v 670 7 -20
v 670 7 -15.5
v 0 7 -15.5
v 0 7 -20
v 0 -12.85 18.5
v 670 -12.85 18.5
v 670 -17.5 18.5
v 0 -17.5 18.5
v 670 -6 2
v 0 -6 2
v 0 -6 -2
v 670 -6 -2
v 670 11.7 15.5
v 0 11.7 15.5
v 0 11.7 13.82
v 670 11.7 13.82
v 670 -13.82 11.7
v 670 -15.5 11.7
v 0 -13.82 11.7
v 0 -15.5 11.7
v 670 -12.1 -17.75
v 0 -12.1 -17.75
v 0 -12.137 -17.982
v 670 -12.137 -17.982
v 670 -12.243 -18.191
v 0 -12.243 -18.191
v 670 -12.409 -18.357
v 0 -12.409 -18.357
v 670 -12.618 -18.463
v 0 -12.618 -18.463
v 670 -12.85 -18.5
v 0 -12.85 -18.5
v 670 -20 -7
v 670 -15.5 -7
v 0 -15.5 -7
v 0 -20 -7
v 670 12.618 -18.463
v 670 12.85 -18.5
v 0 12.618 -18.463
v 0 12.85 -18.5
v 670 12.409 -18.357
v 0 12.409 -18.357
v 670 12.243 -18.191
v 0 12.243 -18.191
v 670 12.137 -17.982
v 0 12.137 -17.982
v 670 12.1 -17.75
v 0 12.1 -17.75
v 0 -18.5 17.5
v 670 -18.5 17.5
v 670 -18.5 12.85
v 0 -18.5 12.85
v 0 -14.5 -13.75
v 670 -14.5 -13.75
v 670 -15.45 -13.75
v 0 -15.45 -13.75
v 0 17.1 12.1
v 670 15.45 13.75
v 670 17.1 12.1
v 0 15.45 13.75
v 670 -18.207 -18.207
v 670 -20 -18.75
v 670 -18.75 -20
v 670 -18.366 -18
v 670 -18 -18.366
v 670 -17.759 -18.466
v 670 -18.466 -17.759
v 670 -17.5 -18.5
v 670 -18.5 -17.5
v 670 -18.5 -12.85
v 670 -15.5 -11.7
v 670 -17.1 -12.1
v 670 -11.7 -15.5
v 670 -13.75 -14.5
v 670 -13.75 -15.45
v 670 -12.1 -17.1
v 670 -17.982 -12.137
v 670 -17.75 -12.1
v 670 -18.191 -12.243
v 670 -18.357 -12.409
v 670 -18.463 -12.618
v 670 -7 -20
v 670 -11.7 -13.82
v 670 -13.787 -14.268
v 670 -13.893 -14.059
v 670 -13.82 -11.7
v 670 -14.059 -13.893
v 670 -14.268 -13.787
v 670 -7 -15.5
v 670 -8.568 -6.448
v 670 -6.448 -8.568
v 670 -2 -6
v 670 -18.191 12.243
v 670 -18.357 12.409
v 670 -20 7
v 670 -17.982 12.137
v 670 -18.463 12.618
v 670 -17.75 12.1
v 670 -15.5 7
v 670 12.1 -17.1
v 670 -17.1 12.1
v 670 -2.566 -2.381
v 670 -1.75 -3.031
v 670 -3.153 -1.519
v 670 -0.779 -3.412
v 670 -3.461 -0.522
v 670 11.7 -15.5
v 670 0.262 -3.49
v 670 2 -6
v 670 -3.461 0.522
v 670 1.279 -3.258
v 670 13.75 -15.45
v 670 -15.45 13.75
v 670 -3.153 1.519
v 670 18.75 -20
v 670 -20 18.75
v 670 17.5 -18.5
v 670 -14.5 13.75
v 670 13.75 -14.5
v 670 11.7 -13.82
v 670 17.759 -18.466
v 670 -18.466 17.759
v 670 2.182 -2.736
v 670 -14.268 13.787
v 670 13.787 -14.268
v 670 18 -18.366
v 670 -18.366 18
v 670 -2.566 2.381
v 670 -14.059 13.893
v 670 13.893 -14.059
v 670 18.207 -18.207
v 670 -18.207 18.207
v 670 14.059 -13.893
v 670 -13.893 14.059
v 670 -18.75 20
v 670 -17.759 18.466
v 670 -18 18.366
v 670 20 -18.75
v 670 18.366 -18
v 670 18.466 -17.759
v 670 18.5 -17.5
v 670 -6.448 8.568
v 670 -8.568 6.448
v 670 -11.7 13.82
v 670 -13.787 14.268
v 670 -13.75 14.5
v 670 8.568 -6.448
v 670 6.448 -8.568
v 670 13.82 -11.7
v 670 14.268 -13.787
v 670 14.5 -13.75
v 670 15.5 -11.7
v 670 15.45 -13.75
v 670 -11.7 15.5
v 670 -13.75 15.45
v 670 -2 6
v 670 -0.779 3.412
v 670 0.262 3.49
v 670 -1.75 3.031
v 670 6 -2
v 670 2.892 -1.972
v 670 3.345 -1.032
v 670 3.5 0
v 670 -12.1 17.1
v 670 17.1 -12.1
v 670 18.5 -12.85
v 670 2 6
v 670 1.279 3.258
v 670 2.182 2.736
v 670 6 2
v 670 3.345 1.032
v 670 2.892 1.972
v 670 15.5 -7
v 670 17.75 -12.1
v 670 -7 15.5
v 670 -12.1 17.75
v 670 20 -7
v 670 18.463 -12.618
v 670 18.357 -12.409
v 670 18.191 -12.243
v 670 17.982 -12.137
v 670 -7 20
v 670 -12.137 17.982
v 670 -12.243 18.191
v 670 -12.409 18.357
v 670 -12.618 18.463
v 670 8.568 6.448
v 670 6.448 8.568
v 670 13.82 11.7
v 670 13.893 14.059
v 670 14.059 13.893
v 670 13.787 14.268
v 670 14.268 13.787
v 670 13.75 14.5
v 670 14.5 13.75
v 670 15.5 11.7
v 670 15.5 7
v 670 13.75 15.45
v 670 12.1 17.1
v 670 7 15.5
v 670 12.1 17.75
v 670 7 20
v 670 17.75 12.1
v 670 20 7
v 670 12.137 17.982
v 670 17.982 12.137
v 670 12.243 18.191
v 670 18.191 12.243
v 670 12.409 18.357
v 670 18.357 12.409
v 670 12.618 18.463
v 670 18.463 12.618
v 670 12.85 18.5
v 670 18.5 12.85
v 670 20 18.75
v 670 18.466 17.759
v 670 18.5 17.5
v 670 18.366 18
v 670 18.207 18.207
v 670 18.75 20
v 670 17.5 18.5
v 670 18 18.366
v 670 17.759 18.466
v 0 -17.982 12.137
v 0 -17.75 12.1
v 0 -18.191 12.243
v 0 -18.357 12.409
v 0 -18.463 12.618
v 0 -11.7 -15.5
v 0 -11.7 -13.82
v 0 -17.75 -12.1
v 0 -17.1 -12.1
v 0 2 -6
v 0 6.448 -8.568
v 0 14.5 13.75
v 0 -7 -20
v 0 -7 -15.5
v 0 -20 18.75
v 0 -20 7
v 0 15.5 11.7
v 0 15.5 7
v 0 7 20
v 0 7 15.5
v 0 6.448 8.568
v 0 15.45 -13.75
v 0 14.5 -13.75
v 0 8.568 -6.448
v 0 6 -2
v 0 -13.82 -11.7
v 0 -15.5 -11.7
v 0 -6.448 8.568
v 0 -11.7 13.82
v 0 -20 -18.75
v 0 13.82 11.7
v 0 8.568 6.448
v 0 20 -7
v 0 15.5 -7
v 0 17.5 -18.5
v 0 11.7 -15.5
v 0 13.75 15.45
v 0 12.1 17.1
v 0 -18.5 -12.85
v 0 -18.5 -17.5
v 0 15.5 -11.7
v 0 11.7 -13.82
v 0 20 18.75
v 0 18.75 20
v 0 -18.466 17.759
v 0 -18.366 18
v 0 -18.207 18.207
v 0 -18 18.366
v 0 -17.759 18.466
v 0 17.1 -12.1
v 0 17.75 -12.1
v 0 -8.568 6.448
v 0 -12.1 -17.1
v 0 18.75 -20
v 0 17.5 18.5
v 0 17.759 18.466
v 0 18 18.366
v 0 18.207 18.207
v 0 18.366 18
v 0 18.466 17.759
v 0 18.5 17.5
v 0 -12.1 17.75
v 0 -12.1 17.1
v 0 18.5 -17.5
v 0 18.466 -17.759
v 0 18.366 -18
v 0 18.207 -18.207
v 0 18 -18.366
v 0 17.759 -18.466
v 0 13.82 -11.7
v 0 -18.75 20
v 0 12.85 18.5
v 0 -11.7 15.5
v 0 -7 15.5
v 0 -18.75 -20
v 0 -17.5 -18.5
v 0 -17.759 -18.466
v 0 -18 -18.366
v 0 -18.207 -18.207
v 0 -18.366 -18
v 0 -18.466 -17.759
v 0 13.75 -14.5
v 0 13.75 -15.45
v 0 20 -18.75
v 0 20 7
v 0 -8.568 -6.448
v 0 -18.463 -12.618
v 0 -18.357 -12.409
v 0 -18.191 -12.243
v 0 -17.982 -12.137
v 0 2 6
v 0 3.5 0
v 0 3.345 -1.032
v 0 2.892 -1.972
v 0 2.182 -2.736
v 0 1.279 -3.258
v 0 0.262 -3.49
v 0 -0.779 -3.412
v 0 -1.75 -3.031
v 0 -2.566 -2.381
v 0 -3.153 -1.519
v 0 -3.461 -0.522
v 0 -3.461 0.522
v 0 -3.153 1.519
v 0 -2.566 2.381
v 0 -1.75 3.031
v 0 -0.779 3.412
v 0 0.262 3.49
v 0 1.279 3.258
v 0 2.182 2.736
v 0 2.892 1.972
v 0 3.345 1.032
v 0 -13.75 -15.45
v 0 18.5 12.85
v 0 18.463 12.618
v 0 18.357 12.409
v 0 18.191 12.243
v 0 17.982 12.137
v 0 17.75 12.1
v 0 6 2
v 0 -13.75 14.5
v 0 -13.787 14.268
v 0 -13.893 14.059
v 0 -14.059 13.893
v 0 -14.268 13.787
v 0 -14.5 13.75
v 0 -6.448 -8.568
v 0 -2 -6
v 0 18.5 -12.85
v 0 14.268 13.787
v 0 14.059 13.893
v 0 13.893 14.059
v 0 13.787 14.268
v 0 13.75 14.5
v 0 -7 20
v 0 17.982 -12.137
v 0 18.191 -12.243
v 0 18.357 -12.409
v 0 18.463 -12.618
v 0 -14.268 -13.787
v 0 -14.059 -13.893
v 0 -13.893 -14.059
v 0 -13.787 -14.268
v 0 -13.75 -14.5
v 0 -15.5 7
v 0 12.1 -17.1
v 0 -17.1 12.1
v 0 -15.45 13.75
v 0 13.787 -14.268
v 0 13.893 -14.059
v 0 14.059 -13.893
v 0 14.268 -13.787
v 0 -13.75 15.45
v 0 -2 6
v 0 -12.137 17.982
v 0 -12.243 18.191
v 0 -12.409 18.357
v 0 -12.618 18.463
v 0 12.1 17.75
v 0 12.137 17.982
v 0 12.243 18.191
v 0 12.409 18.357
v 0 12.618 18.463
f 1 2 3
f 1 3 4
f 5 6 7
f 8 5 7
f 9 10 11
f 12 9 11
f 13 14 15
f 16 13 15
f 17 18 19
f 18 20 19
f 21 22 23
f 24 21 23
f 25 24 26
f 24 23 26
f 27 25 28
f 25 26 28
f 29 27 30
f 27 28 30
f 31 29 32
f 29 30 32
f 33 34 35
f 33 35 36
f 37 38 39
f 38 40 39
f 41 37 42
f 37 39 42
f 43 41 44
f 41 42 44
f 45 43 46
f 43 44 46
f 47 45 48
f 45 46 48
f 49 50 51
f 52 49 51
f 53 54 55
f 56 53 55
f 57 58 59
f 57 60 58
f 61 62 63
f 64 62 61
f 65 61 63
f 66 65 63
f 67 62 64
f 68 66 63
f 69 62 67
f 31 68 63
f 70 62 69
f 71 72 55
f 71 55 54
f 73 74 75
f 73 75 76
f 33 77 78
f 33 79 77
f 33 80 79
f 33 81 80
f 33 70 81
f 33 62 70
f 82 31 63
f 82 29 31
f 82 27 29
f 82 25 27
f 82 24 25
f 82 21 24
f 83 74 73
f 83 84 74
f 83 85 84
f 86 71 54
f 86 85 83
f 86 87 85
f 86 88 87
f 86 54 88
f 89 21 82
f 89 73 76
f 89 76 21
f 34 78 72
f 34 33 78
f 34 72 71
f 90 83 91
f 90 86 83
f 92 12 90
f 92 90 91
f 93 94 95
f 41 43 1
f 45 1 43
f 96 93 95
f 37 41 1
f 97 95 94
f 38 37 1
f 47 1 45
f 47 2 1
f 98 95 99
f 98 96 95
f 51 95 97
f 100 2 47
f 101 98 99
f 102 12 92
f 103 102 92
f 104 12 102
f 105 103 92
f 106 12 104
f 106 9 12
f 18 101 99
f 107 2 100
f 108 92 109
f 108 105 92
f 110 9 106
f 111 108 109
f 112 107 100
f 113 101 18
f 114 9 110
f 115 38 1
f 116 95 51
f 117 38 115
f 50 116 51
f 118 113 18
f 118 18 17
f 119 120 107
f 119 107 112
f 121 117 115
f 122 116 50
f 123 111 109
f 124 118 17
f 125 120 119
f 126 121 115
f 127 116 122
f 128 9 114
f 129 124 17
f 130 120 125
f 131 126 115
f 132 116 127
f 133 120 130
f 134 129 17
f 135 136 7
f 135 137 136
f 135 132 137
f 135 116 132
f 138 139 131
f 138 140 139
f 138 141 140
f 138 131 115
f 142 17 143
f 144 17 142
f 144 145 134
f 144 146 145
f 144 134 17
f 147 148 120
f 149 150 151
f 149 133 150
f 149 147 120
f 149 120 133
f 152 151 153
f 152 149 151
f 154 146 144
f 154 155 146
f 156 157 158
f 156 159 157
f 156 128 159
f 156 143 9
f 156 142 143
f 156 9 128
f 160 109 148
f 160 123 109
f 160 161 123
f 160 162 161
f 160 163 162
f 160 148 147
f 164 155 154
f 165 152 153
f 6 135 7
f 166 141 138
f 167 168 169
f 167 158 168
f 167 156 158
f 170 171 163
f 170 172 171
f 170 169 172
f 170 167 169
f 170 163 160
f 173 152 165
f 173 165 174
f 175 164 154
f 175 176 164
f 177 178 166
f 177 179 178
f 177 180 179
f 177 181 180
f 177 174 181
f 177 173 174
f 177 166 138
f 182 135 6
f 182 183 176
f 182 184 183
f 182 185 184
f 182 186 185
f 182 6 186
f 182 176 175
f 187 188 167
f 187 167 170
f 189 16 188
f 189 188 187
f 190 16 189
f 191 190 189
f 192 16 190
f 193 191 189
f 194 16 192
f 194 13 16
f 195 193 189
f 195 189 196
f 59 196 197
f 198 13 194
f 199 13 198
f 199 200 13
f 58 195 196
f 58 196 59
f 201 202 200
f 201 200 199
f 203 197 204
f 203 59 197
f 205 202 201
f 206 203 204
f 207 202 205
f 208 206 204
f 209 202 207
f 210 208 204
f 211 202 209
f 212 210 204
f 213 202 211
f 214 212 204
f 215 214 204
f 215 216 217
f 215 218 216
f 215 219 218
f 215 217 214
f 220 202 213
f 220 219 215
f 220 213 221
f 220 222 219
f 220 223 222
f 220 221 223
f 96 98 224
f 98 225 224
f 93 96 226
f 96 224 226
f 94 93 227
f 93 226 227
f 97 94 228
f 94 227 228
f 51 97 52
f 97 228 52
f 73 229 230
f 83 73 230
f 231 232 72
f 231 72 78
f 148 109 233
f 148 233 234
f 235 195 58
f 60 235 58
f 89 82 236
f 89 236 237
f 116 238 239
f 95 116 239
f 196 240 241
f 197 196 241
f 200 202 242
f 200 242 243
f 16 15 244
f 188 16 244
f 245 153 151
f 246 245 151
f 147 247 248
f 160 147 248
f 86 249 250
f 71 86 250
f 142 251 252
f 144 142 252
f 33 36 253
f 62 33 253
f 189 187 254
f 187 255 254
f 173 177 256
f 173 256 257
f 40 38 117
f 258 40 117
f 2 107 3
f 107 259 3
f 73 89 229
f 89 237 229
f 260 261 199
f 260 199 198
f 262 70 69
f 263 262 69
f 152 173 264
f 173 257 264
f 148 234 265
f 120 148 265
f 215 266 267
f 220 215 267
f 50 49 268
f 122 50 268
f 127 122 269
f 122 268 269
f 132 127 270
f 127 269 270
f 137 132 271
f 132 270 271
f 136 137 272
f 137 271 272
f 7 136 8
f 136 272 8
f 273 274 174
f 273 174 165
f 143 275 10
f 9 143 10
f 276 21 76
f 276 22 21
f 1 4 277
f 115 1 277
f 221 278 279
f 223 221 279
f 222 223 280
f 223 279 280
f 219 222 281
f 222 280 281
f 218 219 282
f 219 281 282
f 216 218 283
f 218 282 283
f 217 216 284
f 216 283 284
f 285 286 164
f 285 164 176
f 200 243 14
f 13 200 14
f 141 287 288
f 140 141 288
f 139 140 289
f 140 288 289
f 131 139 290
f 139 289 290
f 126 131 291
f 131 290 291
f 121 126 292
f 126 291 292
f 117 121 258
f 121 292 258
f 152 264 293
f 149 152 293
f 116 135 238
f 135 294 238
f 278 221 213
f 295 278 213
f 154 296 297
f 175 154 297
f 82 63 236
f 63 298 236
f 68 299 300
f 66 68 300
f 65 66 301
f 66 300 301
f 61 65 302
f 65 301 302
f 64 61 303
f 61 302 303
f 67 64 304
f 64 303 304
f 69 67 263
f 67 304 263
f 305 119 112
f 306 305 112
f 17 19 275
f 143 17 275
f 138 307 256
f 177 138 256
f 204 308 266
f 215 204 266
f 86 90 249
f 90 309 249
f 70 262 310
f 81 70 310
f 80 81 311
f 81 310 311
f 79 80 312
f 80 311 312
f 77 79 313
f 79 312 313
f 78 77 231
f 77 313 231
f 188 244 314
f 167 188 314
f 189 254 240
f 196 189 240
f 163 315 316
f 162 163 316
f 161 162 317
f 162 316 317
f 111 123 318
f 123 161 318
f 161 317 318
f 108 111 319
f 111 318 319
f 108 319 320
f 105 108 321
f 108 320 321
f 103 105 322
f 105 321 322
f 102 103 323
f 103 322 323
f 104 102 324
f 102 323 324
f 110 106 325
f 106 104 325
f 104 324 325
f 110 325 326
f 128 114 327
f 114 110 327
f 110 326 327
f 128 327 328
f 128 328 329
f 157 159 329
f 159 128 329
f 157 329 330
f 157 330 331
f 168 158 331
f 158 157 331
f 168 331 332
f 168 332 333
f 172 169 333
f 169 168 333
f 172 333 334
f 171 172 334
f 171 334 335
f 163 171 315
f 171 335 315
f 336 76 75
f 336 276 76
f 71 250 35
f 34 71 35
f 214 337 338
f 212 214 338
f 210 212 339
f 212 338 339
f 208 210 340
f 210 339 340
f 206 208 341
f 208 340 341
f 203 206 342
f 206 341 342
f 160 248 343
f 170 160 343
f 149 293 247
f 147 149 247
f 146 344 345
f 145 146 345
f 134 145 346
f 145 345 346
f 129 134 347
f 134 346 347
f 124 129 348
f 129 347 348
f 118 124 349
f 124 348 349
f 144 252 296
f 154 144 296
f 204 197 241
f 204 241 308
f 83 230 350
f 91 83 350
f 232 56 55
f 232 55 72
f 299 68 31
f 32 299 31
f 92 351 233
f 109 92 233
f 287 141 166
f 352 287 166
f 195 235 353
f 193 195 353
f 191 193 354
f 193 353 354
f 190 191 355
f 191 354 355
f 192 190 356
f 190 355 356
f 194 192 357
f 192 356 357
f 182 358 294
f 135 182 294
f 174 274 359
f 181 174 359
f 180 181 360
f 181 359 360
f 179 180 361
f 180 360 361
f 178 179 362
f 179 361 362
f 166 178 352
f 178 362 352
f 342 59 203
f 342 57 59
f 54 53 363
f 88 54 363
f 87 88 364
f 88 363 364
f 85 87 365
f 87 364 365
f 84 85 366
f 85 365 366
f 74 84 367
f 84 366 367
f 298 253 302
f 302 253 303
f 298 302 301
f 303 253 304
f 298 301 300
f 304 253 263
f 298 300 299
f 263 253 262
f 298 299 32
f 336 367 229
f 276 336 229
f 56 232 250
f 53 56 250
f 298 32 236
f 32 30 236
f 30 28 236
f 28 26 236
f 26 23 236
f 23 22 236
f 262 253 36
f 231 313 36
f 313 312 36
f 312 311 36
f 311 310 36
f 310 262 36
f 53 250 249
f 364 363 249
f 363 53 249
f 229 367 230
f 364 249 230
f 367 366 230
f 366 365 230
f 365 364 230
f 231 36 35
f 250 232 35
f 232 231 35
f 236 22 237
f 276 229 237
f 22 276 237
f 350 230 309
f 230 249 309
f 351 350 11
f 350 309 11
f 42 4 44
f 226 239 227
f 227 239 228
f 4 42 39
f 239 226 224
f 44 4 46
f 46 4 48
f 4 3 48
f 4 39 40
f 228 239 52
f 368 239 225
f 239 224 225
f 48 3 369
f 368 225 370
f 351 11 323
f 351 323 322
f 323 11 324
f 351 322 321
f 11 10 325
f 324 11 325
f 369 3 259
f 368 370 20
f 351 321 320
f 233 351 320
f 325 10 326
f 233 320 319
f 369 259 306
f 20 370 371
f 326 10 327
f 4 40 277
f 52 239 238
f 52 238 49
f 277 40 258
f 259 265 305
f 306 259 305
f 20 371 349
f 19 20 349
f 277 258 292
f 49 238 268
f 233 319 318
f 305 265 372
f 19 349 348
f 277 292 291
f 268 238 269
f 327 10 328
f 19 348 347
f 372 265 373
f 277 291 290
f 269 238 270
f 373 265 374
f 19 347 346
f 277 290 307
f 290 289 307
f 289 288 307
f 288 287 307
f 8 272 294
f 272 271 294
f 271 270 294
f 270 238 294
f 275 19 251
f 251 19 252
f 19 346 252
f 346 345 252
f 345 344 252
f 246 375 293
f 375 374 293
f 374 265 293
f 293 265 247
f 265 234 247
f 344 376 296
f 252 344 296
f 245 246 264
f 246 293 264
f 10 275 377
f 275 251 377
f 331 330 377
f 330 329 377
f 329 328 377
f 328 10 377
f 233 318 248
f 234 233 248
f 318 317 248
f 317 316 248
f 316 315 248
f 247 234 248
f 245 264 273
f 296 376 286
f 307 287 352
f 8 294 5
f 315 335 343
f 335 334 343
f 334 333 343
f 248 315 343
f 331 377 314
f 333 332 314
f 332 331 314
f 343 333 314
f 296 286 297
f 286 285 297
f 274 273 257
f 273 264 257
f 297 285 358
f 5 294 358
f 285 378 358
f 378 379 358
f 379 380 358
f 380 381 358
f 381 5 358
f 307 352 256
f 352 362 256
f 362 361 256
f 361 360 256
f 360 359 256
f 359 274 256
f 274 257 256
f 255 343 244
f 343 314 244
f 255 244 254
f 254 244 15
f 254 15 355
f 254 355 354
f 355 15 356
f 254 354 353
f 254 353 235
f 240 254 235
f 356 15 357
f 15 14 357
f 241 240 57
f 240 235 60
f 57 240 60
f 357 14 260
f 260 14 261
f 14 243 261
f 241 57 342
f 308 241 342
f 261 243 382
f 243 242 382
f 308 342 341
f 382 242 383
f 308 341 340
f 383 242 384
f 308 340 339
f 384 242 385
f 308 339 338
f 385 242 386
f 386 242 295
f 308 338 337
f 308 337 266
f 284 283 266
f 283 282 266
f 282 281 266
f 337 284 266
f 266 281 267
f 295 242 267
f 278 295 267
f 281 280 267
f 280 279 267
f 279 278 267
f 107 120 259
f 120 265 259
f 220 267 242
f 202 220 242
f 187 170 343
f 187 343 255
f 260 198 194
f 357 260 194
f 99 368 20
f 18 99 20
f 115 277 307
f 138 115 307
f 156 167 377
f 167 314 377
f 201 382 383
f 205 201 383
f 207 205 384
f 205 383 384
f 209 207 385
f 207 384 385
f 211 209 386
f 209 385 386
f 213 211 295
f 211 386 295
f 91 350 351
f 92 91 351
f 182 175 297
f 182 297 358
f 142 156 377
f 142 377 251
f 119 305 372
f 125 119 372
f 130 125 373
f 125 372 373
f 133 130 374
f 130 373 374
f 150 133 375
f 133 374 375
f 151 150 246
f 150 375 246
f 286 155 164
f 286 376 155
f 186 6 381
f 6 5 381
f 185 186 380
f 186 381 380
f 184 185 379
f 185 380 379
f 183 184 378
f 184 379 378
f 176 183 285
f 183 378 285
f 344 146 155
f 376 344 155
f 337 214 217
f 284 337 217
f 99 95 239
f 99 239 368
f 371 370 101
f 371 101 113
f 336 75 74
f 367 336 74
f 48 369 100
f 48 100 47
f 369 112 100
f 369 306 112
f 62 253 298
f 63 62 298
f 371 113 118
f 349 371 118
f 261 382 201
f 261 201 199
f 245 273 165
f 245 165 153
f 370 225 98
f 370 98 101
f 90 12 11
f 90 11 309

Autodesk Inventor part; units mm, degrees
sketch "Skizze_1" plane through (0, 0, 0) normal (1, 0, 0) x (0, 1, 0)
  line L0 (18.75, 20) -> (7, 20)
  line L1 (7, 20) -> (7, 15.5)
  line L2 (7, 15.5) -> (11.7, 15.5)
  line L3 (11.7, 15.5) -> (11.7, 13.82)
  line L4 (11.7, 13.82) -> (6.4481, 8.5681)
  line L5 (6.4481, 8.5681) -> (2, 6)
  line L6 (2, 6) -> (-2, 6)
  line L7 (-2, 6) -> (-6.4481, 8.5681)
  line L8 (-6.4481, 8.5681) -> (-11.7, 13.82)
  line L9 (-11.7, 13.82) -> (-11.7, 15.5)
  line L10 (-11.7, 15.5) -> (-7, 15.5)
  line L11 (-7, 15.5) -> (-7, 20)
  line L12 (-7, 20) -> (-18.75, 20)
  line L13 (-18.75, 20) -> (-20, 18.75)
  line L14 (-20, 18.75) -> (-20, 7)
  line L15 (-20, 7) -> (-15.5, 7)
  line L16 (-15.5, 7) -> (-15.5, 11.7)
  line L17 (-15.5, 11.7) -> (-13.82, 11.7)
  line L18 (-13.82, 11.7) -> (-8.5681, 6.4481)
  line L19 (-8.5681, 6.4481) -> (-6, 2)
  line L20 (-6, 2) -> (-6, -2)
  line L21 (-6, -2) -> (-8.5681, -6.4481)
  line L22 (-8.5681, -6.4481) -> (-13.82, -11.7)
  line L23 (-13.82, -11.7) -> (-15.5, -11.7)
  line L24 (-15.5, -11.7) -> (-15.5, -7)
  line L25 (-15.5, -7) -> (-20, -7)
  line L26 (-20, -7) -> (-20, -18.75)
  line L27 (-20, -18.75) -> (-18.75, -20)
  line L28 (-18.75, -20) -> (-7, -20)
  line L29 (-7, -20) -> (-7, -15.5)
  line L30 (-7, -15.5) -> (-11.7, -15.5)
  line L31 (-11.7, -15.5) -> (-11.7, -13.82)
  line L32 (-11.7, -13.82) -> (-6.4481, -8.5681)
  line L33 (-6.4481, -8.5681) -> (-2, -6)
  line L34 (-2, -6) -> (2, -6)
  line L35 (2, -6) -> (6.4481, -8.5681)
  line L36 (6.4481, -8.5681) -> (11.7, -13.82)
  line L37 (11.7, -13.82) -> (11.7, -15.5)
  line L38 (11.7, -15.5) -> (7, -15.5)
  line L39 (7, -15.5) -> (7, -20)
  line L40 (7, -20) -> (18.75, -20)
  line L41 (18.75, -20) -> (20, -18.75)
  line L42 (20, -18.75) -> (20, -7)
  line L43 (20, -7) -> (15.5, -7)
  line L44 (15.5, -7) -> (15.5, -11.7)
  line L45 (15.5, -11.7) -> (13.82, -11.7)
  line L46 (13.82, -11.7) -> (8.5681, -6.4481)
  line L47 (8.5681, -6.4481) -> (6, -2)
  line L48 (6, -2) -> (6, 2)
  line L49 (6, 2) -> (8.5681, 6.4481)
  line L50 (8.5681, 6.4481) -> (13.82, 11.7)
  line L51 (13.82, 11.7) -> (15.5, 11.7)
  line L52 (15.5, 11.7) -> (15.5, 7)
  line L53 (15.5, 7) -> (20, 7)
  line L54 (20, 7) -> (20, 18.75)
  line L55 (20, 18.75) -> (18.75, 20)
  line L56 (17.75, -12.1) -> (17.1, -12.1)
  line L57 (17.1, -12.1) -> (15.45, -13.75)
  line L58 (15.45, -13.75) -> (14.5, -13.75)
  arc A0 (14.5, -13.75) -> (13.75, -14.5) centre (14.5, -14.5) ccw
  line L59 (13.75, -14.5) -> (13.75, -15.45)
  line L60 (13.75, -15.45) -> (12.1, -17.1)
  line L61 (12.1, -17.1) -> (12.1, -17.75)
  arc A1 (12.1, -17.75) -> (12.85, -18.5) centre (12.85, -17.75) ccw
  line L62 (12.85, -18.5) -> (17.5, -18.5)
  arc A2 (17.5, -18.5) -> (18.5, -17.5) centre (17.5, -17.5) ccw
  line L63 (18.5, -17.5) -> (18.5, -12.85)
  arc A3 (18.5, -12.85) -> (17.75, -12.1) centre (17.75, -12.85) ccw
  line L64 (-17.1, -12.1) -> (-17.75, -12.1)
  arc A4 (-17.75, -12.1) -> (-18.5, -12.85) centre (-17.75, -12.85) ccw
  line L65 (-18.5, -12.85) -> (-18.5, -17.5)
  arc A5 (-18.5, -17.5) -> (-17.5, -18.5) centre (-17.5, -17.5) ccw
  line L66 (-17.5, -18.5) -> (-12.85, -18.5)
  arc A6 (-12.85, -18.5) -> (-12.1, -17.75) centre (-12.85, -17.75) ccw
  line L67 (-12.1, -17.75) -> (-12.1, -17.1)
  line L68 (-12.1, -17.1) -> (-13.75, -15.45)
  line L69 (-13.75, -15.45) -> (-13.75, -14.5)
  arc A7 (-13.75, -14.5) -> (-14.5, -13.75) centre (-14.5, -14.5) ccw
  line L70 (-14.5, -13.75) -> (-15.45, -13.75)
  line L71 (-15.45, -13.75) -> (-17.1, -12.1)
  circle A8 centre (0, 0) radius 3.5
  arc A9 (-17.5, 18.5) -> (-18.5, 17.5) centre (-17.5, 17.5) ccw
  line L72 (-18.5, 17.5) -> (-18.5, 12.85)
  arc A10 (-18.5, 12.85) -> (-17.75, 12.1) centre (-17.75, 12.85) ccw
  line L73 (-17.75, 12.1) -> (-17.1, 12.1)
  line L74 (-17.1, 12.1) -> (-15.45, 13.75)
  line L75 (-15.45, 13.75) -> (-14.5, 13.75)
  arc A11 (-14.5, 13.75) -> (-13.75, 14.5) centre (-14.5, 14.5) ccw
  line L76 (-13.75, 14.5) -> (-13.75, 15.45)
  line L77 (-13.75, 15.45) -> (-12.1, 17.1)
  line L78 (-12.1, 17.1) -> (-12.1, 17.75)
  arc A12 (-12.1, 17.75) -> (-12.85, 18.5) centre (-12.85, 17.75) ccw
  line L79 (-12.85, 18.5) -> (-17.5, 18.5)
  line L80 (17.5, 18.5) -> (12.85, 18.5)
  arc A13 (12.85, 18.5) -> (12.1, 17.75) centre (12.85, 17.75) ccw
  line L81 (12.1, 17.75) -> (12.1, 17.1)
  line L82 (12.1, 17.1) -> (13.75, 15.45)
  line L83 (13.75, 15.45) -> (13.75, 14.5)
  arc A14 (13.75, 14.5) -> (14.5, 13.75) centre (14.5, 14.5) ccw
  line L84 (14.5, 13.75) -> (15.45, 13.75)
  line L85 (15.45, 13.75) -> (17.1, 12.1)
  line L86 (17.1, 12.1) -> (17.75, 12.1)
  arc A15 (17.75, 12.1) -> (18.5, 12.85) centre (17.75, 12.85) ccw
  line L87 (18.5, 12.85) -> (18.5, 17.5)
  arc A16 (18.5, 17.5) -> (17.5, 18.5) centre (17.5, 17.5) ccw
extrude "Extrusion1" add sketch "Skizze_1" along normal blind 670
ref_plane "CS_ANBAU_HINTEN_LINKS_XY" through (670, 0, 20) normal (1, 0, 0) x (0, 0, -1)
ref_plane "CS_ANBAU_HINTEN_LINKS_YZ" through (670, 0, 20) normal (0, 0, -1) x (0, 1, 0)
ref_plane "CS_ANBAU_HINTEN_LINKS_ZX" through (670, 0, 20) normal (0, 1, 0) x (1, 0, 0)
ref_plane "CS_ANBAU_HINTEN_OBEN_XY" through (670, 20, 0) normal (1, 0, 0) x (0, 0, -1)
ref_plane "CS_ANBAU_HINTEN_OBEN_YZ" through (670, 20, 0) normal (0, 0, -1) x (0, 1, 0)
ref_plane "CS_ANBAU_HINTEN_OBEN_ZX" through (670, 20, 0) normal (0, 1, 0) x (1, 0, 0)
ref_plane "CS_ANBAU_HINTEN_RECHTS_XY" through (670, 0, -20) normal (1, 0, 0) x (0, 0, -1)
ref_plane "CS_ANBAU_HINTEN_RECHTS_YZ" through (670, 0, -20) normal (0, 0, -1) x (0, 1, 0)
ref_plane "CS_ANBAU_HINTEN_RECHTS_ZX" through (670, 0, -20) normal (0, 1, 0) x (1, 0, 0)
ref_plane "CS_ANBAU_HINTEN_UNTEN_XY" through (670, -20, 0) normal (1, 0, 0) x (0, 0, -1)
ref_plane "CS_ANBAU_HINTEN_UNTEN_YZ" through (670, -20, 0) normal (0, 0, -1) x (0, 1, 0)
ref_plane "CS_ANBAU_HINTEN_UNTEN_ZX" through (670, -20, 0) normal (0, 1, 0) x (1, 0, 0)
ref_plane "CS_ANBAU_QUER_XY" through (0, 0, 20) normal (0, 0, 1) x (1, 0, 0)
ref_plane "CS_ANBAU_QUER_YZ" through (0, 0, 20) normal (1, 0, 0) x (0, 1, 0)
ref_plane "CS_ANBAU_QUER_ZX" through (0, 0, 20) normal (0, 1, 0) x (0, 0, 1)
ref_plane "CS_ANBAU_QUER_1_XY" through (670, 0, 20) normal (0, 0, 1) x (1, 0, 0)
ref_plane "CS_ANBAU_QUER_1_YZ" through (670, 0, 20) normal (1, 0, 0) x (0, 1, 0)
ref_plane "CS_ANBAU_QUER_1_ZX" through (670, 0, 20) normal (0, 1, 0) x (0, 0, 1)
ref_plane "CS_ANBAU_VORNE_LINKS_XY" through (0, 0, 20) normal (-1, 0, 0) x (0, 0, -1)
ref_plane "CS_ANBAU_VORNE_LINKS_YZ" through (0, 0, 20) normal (0, 0, -1) x (0, -1, 0)
ref_plane "CS_ANBAU_VORNE_LINKS_ZX" through (0, 0, 20) normal (0, -1, 0) x (-1, 0, 0)
ref_plane "CS_ANBAU_VORNE_OBEN_XY" through (0, 20, 0) normal (-1, 0, 0) x (0, 0, -1)
ref_plane "CS_ANBAU_VORNE_OBEN_YZ" through (0, 20, 0) normal (0, 0, -1) x (0, -1, 0)
ref_plane "CS_ANBAU_VORNE_OBEN_ZX" through (0, 20, 0) normal (0, -1, 0) x (-1, 0, 0)
ref_plane "CS_ANBAU_VORNE_RECHTS_XY" through (0, 0, -20) normal (-1, 0, 0) x (0, 0, -1)
ref_plane "CS_ANBAU_VORNE_RECHTS_YZ" through (0, 0, -20) normal (0, 0, -1) x (0, -1, 0)
ref_plane "CS_ANBAU_VORNE_RECHTS_ZX" through (0, 0, -20) normal (0, -1, 0) x (-1, 0, 0)
ref_plane "CS_ANBAU_VORNE_UNTEN_XY" through (0, -20, 0) normal (-1, 0, 0) x (0, 0, -1)
ref_plane "CS_ANBAU_VORNE_UNTEN_YZ" through (0, -20, 0) normal (0, 0, -1) x (0, -1, 0)
ref_plane "CS_ANBAU_VORNE_UNTEN_ZX" through (0, -20, 0) normal (0, -1, 0) x (-1, 0, 0)
ref_plane "p1_XY" through (0, 20, 0) normal (0, 0, 1) x (1, 0, 0)
ref_plane "p1_YZ" through (0, 20, 0) normal (1, 0, 0) x (0, 1, 0)
ref_plane "p1_ZX" through (0, 20, 0) normal (0, 1, 0) x (0, 0, 1)
ref_plane "p2_XY" through (670, 20, 0) normal (0, 0, 1) x (1, 0, 0)
ref_plane "p2_YZ" through (670, 20, 0) normal (1, 0, 0) x (0, 1, 0)
ref_plane "p2_ZX" through (670, 20, 0) normal (0, 1, 0) x (0, 0, 1)
ref_plane "p3_XY" through (670, -20, 18.75) normal (1, 0, 0) x (0, 0, -1)
ref_plane "p3_YZ" through (670, -20, 18.75) normal (0, 0, -1) x (0, 1, 0)
ref_plane "p3_ZX" through (670, -20, 18.75) normal (0, 1, 0) x (1, 0, 0)
ref_plane "p4_XY" through (670, 20, 18.75) normal (1, 0, 0) x (0, 0, -1)
ref_plane "p4_YZ" through (670, 20, 18.75) normal (0, 0, -1) x (0, 1, 0)
ref_plane "p4_ZX" through (670, 20, 18.75) normal (0, 1, 0) x (1, 0, 0)
ref_plane "p5_XY" through (670, 20, -21.25) normal (1, 0, 0) x (0, 0, -1)
ref_plane "p5_YZ" through (670, 20, -21.25) normal (0, 0, -1) x (0, 1, 0)
ref_plane "p5_ZX" through (670, 20, -21.25) normal (0, 1, 0) x (1, 0, 0)
ref_plane "pm1_XY" through (0, 0, 0) normal (1, 0, 0) x (0, 0, -1)
ref_plane "pm1_YZ" through (0, 0, 0) normal (0, 0, -1) x (0, 1, 0)
ref_plane "pm1_ZX" through (0, 0, 0) normal (0, 1, 0) x (1, 0, 0)
ref_plane "pm2_XY" through (670, 0, -1.25) normal (1, 0, 0) x (0, 0, -1)
ref_plane "pm2_YZ" through (670, 0, -1.25) normal (0, 0, -1) x (0, 1, 0)
ref_plane "pm2_ZX" through (670, 0, -1.25) normal (0, 1, 0) x (1, 0, 0)
properties part number "Robotunits Profil 40 x 40 - PIL 4040 SNN 0670"
